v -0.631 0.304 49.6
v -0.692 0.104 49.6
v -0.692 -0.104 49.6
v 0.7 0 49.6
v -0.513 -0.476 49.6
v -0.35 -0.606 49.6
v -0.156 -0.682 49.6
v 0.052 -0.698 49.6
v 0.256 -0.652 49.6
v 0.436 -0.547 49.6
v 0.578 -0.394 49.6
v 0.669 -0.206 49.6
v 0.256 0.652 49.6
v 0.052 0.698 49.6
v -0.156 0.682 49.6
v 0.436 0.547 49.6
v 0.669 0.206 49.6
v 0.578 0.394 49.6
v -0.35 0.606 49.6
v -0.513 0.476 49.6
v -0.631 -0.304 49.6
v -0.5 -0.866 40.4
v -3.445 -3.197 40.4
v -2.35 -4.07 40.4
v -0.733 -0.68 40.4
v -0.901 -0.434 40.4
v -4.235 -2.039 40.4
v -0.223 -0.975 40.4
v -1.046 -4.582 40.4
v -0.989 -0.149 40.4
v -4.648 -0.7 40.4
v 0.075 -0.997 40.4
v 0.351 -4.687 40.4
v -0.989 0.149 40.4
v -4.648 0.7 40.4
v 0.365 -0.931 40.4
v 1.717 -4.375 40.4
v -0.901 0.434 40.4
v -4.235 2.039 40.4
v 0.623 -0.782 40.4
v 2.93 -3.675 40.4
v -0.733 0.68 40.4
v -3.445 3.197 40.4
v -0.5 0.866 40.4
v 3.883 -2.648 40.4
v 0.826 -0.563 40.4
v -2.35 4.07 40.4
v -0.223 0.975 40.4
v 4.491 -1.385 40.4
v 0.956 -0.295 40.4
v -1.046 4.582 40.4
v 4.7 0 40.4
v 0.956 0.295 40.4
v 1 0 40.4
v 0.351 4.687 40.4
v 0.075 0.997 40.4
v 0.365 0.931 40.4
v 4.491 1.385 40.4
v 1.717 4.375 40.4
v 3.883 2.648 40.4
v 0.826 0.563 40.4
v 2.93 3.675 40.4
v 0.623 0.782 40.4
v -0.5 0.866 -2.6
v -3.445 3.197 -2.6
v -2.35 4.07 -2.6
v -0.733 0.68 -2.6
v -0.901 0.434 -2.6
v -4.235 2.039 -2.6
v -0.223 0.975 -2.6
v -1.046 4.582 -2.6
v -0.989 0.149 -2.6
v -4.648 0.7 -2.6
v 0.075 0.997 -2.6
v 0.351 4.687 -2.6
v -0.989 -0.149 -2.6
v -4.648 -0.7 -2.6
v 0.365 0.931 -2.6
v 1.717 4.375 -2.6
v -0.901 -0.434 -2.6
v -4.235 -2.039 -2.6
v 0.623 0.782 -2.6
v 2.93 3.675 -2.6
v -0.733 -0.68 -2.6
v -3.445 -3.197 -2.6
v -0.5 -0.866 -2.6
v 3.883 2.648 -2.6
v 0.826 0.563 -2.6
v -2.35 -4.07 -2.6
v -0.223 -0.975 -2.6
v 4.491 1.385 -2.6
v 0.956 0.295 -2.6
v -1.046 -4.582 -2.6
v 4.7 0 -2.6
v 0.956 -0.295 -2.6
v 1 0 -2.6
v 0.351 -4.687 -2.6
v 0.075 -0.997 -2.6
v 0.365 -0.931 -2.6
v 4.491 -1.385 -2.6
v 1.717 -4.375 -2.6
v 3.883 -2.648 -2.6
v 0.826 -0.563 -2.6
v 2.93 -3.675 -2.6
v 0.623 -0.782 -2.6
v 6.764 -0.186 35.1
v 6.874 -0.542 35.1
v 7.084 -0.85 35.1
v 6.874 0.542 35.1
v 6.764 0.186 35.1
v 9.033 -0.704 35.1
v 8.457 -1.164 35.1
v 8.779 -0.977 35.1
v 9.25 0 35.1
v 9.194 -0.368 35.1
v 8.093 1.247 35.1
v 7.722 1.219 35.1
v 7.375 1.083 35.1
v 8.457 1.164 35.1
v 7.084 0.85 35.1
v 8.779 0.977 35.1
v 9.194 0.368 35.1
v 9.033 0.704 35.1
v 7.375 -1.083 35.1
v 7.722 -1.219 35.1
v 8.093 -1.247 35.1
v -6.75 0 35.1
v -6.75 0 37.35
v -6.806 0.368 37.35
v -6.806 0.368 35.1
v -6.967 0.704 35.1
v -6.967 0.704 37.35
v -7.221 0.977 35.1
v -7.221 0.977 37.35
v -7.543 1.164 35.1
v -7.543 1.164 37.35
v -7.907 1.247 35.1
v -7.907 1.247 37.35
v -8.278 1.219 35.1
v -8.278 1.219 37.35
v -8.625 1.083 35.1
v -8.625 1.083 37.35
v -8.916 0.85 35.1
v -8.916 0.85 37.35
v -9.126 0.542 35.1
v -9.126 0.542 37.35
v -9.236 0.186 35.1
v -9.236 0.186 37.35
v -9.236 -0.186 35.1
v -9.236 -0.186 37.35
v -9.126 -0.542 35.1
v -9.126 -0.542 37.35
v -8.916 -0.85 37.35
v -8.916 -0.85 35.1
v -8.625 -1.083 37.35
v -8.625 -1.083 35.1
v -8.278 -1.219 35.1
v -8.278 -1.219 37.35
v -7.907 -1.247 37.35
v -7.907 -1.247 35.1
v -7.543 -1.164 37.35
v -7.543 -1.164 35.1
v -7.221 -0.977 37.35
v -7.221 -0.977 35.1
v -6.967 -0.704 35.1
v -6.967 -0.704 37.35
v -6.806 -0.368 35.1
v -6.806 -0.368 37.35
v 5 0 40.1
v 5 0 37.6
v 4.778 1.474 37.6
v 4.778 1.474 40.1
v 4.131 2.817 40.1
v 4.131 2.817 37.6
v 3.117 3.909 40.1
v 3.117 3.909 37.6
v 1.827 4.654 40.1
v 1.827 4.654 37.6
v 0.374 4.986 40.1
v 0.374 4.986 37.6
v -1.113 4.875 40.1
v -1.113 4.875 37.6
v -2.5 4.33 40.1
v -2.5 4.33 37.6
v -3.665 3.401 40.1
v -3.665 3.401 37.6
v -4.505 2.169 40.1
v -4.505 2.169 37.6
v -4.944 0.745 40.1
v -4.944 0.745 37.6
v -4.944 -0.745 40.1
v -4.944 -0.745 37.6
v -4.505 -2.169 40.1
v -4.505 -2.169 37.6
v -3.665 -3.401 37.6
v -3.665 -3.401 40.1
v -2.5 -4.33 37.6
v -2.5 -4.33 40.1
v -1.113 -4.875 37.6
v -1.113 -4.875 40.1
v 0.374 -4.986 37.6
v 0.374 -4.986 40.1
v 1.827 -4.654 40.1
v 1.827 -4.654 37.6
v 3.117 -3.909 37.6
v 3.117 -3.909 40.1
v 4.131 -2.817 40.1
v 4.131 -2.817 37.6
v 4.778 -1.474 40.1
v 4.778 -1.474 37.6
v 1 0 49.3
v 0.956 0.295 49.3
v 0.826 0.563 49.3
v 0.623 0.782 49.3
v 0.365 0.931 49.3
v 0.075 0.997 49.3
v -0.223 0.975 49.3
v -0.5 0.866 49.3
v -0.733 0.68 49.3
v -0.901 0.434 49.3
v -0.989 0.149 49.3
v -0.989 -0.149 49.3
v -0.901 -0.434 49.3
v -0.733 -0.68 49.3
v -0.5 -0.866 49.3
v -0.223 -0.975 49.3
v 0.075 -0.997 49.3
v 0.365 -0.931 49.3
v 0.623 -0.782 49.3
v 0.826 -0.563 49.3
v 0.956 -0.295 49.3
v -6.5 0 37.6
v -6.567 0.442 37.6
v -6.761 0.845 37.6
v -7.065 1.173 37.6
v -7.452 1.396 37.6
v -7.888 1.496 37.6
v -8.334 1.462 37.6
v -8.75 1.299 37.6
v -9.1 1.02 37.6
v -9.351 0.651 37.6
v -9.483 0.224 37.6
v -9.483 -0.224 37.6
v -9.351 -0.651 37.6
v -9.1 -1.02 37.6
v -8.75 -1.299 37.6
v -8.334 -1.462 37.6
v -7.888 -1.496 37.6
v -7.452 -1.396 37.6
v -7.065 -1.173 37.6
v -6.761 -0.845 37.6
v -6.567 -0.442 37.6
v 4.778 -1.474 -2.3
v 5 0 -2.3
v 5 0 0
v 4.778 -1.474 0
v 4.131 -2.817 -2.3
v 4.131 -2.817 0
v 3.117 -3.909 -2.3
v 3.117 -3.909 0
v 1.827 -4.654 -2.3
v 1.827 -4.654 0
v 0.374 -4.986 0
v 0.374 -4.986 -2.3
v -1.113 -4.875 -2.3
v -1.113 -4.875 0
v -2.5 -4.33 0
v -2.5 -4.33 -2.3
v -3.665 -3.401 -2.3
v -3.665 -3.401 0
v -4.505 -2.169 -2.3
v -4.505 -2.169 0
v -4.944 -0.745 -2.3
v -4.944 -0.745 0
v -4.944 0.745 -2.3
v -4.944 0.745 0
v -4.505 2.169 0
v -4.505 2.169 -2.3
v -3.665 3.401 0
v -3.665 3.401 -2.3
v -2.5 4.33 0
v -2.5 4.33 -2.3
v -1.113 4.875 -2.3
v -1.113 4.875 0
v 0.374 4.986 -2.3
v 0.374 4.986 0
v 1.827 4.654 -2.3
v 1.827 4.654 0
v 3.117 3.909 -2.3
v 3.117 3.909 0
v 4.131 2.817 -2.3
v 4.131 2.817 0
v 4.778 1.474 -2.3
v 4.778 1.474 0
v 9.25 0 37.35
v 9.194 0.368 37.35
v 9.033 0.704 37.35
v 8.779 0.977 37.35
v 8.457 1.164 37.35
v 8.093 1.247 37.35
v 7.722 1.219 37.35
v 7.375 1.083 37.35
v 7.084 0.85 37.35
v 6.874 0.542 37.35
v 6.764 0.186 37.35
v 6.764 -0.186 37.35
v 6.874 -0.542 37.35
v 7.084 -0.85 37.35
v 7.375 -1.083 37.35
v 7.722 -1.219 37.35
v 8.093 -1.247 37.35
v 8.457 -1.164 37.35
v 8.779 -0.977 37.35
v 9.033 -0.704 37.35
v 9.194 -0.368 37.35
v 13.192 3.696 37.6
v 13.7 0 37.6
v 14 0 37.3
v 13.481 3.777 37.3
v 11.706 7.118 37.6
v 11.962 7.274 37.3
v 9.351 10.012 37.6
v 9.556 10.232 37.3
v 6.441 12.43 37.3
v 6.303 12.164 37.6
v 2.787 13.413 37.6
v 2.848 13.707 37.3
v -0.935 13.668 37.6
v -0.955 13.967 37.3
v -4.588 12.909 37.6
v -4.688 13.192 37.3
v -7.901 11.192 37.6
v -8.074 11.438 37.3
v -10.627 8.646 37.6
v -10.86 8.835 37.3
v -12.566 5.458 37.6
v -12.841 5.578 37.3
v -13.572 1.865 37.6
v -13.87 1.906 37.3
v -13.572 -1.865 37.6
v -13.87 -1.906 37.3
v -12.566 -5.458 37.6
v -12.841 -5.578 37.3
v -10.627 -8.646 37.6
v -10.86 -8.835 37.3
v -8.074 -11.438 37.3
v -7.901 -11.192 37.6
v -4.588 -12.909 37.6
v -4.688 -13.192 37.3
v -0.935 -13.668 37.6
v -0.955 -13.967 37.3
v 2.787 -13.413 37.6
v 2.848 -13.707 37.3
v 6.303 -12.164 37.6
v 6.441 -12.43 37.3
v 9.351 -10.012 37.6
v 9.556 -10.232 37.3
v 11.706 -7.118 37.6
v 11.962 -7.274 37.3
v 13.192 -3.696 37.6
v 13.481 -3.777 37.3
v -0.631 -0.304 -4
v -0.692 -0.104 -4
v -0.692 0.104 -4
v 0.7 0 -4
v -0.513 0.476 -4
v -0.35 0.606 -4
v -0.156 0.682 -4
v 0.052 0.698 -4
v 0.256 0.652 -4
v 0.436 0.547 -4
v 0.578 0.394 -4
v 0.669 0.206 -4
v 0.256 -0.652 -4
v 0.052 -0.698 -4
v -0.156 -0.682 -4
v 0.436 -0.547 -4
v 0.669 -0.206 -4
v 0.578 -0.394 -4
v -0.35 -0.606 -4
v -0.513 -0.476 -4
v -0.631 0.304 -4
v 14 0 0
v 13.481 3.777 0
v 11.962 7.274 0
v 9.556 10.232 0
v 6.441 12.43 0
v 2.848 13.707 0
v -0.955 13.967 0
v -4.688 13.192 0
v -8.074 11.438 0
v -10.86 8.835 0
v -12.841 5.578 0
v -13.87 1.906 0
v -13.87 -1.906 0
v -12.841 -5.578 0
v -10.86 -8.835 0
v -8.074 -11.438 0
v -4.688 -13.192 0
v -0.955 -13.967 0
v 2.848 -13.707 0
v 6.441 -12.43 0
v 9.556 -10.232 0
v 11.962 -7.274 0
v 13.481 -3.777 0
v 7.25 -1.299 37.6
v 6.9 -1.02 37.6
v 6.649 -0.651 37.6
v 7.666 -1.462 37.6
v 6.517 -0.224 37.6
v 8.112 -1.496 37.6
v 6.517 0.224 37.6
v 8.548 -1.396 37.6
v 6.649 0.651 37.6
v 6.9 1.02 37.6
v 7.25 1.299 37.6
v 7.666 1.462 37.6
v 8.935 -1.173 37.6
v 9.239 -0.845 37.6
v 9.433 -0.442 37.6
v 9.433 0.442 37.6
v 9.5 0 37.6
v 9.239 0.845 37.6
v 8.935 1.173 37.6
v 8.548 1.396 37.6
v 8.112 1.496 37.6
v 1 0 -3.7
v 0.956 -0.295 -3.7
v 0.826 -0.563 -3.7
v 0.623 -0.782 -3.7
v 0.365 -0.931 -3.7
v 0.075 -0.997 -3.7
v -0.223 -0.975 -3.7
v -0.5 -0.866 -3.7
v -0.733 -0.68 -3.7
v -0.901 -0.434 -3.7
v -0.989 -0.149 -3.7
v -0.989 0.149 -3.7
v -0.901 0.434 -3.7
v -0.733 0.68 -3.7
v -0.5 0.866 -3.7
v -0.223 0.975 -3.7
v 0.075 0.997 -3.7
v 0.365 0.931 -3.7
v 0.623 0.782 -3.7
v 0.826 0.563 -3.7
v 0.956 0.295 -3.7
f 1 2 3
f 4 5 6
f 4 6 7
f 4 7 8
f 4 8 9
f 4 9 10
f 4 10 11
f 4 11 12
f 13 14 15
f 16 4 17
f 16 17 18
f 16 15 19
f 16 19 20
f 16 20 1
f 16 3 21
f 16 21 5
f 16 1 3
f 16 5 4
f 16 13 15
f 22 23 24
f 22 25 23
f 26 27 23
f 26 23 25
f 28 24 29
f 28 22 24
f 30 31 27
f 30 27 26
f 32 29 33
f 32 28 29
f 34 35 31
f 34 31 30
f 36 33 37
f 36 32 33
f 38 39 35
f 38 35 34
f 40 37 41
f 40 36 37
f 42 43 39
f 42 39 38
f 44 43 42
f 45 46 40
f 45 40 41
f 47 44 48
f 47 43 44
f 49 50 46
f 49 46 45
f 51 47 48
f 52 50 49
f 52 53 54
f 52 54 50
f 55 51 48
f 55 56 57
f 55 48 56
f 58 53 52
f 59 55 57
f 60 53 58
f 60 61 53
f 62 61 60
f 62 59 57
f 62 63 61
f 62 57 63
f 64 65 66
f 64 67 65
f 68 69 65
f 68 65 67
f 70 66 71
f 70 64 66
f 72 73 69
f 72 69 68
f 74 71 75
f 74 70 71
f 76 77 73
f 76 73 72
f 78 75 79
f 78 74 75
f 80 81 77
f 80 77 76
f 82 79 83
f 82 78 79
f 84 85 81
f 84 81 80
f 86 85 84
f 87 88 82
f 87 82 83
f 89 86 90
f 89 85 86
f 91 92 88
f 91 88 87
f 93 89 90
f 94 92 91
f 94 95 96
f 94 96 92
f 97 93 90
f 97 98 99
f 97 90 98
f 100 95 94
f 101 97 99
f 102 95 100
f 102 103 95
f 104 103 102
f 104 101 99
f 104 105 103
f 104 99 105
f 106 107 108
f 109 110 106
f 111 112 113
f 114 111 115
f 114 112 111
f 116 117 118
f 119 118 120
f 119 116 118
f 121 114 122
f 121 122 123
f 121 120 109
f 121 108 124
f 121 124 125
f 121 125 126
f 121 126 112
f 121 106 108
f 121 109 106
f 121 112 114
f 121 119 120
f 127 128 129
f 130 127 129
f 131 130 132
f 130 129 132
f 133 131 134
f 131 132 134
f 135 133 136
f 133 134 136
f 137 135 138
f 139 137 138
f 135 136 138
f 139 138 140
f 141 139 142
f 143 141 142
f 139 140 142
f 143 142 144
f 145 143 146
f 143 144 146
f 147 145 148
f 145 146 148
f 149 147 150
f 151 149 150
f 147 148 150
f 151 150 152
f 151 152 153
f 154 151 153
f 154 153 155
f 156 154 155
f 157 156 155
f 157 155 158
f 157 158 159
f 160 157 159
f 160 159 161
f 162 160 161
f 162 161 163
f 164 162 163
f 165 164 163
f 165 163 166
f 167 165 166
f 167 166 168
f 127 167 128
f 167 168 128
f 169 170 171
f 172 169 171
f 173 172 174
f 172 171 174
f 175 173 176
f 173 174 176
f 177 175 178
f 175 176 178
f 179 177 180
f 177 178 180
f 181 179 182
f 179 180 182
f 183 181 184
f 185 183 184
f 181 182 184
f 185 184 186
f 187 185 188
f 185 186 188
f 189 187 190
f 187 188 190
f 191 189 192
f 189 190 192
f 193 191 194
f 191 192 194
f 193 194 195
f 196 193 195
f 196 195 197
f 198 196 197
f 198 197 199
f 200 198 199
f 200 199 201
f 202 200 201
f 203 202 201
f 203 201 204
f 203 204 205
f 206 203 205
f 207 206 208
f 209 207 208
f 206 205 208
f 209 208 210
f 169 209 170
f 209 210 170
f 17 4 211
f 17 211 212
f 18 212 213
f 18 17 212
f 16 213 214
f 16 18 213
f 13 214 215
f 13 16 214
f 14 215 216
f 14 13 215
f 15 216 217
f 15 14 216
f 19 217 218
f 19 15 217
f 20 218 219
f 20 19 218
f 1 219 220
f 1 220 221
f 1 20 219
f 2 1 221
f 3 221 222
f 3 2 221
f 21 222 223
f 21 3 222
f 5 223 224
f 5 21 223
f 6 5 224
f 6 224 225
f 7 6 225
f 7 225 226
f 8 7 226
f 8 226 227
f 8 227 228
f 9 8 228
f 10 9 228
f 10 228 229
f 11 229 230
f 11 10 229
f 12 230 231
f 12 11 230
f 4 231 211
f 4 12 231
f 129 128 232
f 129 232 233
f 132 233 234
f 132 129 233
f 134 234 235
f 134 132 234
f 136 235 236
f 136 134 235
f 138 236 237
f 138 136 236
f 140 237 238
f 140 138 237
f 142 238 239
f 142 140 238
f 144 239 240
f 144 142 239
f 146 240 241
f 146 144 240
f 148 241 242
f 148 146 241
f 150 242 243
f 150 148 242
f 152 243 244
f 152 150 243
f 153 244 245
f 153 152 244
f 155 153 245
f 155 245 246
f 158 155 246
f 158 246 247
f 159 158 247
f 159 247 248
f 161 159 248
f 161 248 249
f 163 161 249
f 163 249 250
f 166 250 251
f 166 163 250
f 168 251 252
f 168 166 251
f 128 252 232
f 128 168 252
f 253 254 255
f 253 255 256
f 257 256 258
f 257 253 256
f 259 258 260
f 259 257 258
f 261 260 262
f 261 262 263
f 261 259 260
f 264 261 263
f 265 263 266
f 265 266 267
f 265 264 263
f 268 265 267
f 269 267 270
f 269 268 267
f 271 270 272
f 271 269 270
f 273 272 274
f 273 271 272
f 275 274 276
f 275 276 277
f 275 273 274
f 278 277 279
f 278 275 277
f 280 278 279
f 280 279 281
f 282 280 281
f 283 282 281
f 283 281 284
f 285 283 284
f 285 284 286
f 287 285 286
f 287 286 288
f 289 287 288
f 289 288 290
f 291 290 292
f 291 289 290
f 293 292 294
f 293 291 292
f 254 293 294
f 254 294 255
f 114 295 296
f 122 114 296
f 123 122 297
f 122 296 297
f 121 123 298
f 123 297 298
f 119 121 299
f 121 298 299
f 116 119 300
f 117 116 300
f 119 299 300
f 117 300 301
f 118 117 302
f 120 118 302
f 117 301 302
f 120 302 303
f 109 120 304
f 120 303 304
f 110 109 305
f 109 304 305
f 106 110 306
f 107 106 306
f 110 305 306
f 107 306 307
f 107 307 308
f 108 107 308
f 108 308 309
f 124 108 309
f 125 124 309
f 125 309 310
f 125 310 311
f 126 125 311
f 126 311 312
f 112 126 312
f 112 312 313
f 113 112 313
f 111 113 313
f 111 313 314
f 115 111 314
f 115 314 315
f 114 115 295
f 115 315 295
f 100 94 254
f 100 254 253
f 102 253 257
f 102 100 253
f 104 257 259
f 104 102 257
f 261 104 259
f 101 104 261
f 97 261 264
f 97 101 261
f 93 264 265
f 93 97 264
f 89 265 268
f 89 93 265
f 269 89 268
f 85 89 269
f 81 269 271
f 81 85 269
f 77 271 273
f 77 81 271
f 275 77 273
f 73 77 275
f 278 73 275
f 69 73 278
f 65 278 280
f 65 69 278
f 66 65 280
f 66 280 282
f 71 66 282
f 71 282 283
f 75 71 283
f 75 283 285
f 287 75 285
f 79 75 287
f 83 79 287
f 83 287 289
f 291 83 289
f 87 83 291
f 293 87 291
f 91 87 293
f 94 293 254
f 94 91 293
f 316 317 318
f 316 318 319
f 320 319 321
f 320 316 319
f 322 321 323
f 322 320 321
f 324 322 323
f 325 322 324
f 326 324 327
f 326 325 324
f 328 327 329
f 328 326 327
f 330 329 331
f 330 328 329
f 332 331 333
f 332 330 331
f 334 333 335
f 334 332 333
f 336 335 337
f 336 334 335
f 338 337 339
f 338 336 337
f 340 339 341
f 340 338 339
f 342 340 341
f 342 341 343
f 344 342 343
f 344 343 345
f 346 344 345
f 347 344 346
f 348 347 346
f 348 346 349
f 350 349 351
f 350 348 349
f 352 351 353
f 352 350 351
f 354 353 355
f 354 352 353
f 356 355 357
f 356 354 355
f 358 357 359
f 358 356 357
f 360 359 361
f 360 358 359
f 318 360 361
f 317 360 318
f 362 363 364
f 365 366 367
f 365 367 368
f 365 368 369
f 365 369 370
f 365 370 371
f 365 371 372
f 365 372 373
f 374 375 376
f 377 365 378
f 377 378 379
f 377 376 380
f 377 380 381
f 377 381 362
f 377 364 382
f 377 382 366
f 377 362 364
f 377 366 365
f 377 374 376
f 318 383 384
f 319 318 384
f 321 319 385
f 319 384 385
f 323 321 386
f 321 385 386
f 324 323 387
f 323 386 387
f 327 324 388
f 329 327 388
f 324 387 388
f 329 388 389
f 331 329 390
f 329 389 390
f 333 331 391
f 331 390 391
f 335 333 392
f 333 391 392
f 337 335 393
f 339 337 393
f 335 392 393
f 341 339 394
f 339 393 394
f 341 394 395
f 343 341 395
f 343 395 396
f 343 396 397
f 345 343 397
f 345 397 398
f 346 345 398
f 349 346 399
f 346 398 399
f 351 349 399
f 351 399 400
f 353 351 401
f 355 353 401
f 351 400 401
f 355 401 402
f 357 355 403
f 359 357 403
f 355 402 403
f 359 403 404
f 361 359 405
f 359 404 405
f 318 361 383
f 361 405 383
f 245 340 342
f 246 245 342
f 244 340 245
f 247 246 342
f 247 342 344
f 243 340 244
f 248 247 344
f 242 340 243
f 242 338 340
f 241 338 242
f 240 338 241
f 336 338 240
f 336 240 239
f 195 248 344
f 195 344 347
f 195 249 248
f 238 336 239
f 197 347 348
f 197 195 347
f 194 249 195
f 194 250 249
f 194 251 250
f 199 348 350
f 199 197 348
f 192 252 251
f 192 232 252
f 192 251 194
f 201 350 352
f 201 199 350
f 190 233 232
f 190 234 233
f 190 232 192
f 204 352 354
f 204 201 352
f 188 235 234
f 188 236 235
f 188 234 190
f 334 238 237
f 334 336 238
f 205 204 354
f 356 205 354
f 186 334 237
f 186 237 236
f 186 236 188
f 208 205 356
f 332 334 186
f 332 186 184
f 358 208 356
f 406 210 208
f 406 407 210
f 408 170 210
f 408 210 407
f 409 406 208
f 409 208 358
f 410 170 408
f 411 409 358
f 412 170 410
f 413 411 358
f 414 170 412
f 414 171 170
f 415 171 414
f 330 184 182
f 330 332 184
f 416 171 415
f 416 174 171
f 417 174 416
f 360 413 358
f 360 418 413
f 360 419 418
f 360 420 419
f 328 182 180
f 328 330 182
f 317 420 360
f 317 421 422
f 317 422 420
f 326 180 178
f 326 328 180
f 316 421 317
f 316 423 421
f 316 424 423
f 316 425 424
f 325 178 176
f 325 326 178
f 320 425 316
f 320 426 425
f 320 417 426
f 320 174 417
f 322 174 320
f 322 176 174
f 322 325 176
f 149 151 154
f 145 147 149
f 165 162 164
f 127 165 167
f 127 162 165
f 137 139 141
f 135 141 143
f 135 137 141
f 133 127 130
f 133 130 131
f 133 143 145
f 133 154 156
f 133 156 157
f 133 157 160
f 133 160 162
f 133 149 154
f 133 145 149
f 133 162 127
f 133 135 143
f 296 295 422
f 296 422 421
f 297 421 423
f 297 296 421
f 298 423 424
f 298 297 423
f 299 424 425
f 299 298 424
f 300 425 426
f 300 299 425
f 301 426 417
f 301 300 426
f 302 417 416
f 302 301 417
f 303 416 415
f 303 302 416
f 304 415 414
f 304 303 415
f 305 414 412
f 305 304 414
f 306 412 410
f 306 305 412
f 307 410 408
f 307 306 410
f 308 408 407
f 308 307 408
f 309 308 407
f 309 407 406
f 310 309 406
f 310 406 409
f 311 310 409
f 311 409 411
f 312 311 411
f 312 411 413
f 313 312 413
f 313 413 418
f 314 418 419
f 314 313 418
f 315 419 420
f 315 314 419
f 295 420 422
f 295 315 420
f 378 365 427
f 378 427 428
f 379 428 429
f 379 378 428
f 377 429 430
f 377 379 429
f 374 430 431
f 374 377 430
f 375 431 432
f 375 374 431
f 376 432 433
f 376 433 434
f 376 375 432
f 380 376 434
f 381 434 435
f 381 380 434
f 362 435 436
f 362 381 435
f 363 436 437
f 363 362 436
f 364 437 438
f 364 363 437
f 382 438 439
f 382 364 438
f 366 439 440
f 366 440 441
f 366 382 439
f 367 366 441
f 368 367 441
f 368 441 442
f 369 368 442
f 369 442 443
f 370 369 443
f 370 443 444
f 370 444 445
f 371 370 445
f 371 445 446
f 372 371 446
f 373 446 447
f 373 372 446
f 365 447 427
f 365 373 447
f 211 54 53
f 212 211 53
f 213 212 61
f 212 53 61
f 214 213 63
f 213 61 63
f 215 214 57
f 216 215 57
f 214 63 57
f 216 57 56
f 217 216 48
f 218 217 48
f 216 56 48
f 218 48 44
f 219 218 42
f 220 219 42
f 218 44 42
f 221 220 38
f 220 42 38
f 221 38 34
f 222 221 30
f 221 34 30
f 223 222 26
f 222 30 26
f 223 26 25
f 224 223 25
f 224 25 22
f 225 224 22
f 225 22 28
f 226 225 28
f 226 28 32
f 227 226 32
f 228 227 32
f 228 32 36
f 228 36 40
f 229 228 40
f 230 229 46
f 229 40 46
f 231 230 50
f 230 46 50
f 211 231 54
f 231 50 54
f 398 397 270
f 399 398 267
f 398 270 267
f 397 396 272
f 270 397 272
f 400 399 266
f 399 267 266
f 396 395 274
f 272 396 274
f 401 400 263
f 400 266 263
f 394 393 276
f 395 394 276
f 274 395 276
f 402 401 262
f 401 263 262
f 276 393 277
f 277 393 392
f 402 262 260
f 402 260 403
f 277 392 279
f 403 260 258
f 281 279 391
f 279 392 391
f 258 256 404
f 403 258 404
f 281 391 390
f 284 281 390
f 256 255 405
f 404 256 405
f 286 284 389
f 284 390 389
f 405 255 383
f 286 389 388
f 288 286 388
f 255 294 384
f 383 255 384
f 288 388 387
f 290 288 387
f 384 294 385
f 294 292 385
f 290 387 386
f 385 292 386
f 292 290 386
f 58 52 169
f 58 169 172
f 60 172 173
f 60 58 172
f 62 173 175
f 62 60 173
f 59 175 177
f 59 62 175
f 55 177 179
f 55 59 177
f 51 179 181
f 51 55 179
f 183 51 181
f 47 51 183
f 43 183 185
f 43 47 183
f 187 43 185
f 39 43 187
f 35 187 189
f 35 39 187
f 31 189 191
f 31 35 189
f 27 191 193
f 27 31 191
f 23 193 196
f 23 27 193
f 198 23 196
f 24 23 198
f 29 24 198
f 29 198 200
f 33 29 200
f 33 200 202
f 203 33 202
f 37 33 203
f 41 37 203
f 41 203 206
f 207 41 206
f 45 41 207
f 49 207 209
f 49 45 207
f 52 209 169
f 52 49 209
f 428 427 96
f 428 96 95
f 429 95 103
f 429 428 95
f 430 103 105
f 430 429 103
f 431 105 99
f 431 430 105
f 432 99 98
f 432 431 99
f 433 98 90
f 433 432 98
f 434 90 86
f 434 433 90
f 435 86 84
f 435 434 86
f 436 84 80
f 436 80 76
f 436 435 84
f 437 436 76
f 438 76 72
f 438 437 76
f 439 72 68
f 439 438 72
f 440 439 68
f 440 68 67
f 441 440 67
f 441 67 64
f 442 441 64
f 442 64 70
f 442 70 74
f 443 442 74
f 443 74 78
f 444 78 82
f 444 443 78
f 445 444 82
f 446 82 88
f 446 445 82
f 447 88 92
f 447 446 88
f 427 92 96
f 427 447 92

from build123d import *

# Parameters (mm, degrees)
SKETCH1_R           = 14
BOSS_EXTRUDE1_DEPTH = 37.6
SKETCH2_R           = 5
BOSS_EXTRUDE2_DEPTH = 2.8
SKETCH3_R           = 1
BOSS_EXTRUDE3_DEPTH = 9.2
BOSS_EXTRUDE4_START = 2.6
SKETCH4_R           = 5
BOSS_EXTRUDE4_DEPTH = 2.6
BOSS_EXTRUDE5_START = 1.4
SKETCH5_R           = 1
BOSS_EXTRUDE5_DEPTH = 1.4
CHAMFER1_SIZE       = 0.3
CHAMFER2_SIZE       = 0.3
SKETCH6_R           = 1.25
CUT_EXTRUDE1_DEPTH  = 2.5
CHAMFER3_SIZE       = 0.25


with BuildPart() as part:
    # Sketch1 → Boss-Extrude1 (new body)
    with BuildSketch(Plane.XY):
        Circle(SKETCH1_R)
    extrude(amount=BOSS_EXTRUDE1_DEPTH)

    # Sketch2 → Boss-Extrude2 (add)
    with BuildSketch(Plane.XY.offset(37.6)):
        Circle(SKETCH2_R)
    extrude(amount=BOSS_EXTRUDE2_DEPTH)

    # Sketch3 → Boss-Extrude3 (add)
    with BuildSketch(Plane.XY.offset(40.4)):
        Circle(SKETCH3_R)
    extrude(amount=BOSS_EXTRUDE3_DEPTH)

    # Sketch4 → Boss-Extrude4 (add)
    with BuildSketch(Plane(origin=(0, 0, 0), x_dir=(-1, 0, 0), z_dir=(0, 0, -1)).offset(BOSS_EXTRUDE4_START)):
        with Locations(Location((0, 0, 0), (0, 0, 180))):
            Circle(SKETCH4_R)
    extrude(amount=-BOSS_EXTRUDE4_DEPTH)

    # Sketch5 → Boss-Extrude5 (add)
    with BuildSketch(Plane(origin=(0, 0, -2.6), x_dir=(-1, 0, 0), z_dir=(0, 0, -1)).offset(BOSS_EXTRUDE5_START)):
        with Locations(Location((0, 0, 0), (0, 0, 180))):
            Circle(SKETCH5_R)
    extrude(amount=-BOSS_EXTRUDE5_DEPTH)

    # Chamfer1
    chamfer1_edges = [part.edges().sort_by_distance(p)[0] for p in [
        (-5, 0, -2.6),
        (-14, 0, 37.6),
        (-5, 0, 40.4),
    ]]
    chamfer(chamfer1_edges, length=CHAMFER1_SIZE)

    # Chamfer2
    chamfer2_edges = [part.edges().sort_by_distance(p)[0] for p in [
        (-1, 0, 49.6),
        (-1, 0, -4),
    ]]
    chamfer(chamfer2_edges, length=CHAMFER2_SIZE)

    # Sketch6 → Cut-Extrude1 (cut)
    with BuildSketch(Plane.XY.offset(37.6)):
        with Locations((-8, 0)):
            Circle(SKETCH6_R)
        with Locations((8, 0)):
            Circle(SKETCH6_R)
    extrude(amount=-CUT_EXTRUDE1_DEPTH, mode=Mode.SUBTRACT)

    # Chamfer3
    chamfer3_edges = [part.edges().sort_by_distance(p)[0] for p in [
        (-9.25, 0, 37.6),
        (6.75, 0, 37.6),
    ]]
    chamfer(chamfer3_edges, length=CHAMFER3_SIZE)


solid = part.part
